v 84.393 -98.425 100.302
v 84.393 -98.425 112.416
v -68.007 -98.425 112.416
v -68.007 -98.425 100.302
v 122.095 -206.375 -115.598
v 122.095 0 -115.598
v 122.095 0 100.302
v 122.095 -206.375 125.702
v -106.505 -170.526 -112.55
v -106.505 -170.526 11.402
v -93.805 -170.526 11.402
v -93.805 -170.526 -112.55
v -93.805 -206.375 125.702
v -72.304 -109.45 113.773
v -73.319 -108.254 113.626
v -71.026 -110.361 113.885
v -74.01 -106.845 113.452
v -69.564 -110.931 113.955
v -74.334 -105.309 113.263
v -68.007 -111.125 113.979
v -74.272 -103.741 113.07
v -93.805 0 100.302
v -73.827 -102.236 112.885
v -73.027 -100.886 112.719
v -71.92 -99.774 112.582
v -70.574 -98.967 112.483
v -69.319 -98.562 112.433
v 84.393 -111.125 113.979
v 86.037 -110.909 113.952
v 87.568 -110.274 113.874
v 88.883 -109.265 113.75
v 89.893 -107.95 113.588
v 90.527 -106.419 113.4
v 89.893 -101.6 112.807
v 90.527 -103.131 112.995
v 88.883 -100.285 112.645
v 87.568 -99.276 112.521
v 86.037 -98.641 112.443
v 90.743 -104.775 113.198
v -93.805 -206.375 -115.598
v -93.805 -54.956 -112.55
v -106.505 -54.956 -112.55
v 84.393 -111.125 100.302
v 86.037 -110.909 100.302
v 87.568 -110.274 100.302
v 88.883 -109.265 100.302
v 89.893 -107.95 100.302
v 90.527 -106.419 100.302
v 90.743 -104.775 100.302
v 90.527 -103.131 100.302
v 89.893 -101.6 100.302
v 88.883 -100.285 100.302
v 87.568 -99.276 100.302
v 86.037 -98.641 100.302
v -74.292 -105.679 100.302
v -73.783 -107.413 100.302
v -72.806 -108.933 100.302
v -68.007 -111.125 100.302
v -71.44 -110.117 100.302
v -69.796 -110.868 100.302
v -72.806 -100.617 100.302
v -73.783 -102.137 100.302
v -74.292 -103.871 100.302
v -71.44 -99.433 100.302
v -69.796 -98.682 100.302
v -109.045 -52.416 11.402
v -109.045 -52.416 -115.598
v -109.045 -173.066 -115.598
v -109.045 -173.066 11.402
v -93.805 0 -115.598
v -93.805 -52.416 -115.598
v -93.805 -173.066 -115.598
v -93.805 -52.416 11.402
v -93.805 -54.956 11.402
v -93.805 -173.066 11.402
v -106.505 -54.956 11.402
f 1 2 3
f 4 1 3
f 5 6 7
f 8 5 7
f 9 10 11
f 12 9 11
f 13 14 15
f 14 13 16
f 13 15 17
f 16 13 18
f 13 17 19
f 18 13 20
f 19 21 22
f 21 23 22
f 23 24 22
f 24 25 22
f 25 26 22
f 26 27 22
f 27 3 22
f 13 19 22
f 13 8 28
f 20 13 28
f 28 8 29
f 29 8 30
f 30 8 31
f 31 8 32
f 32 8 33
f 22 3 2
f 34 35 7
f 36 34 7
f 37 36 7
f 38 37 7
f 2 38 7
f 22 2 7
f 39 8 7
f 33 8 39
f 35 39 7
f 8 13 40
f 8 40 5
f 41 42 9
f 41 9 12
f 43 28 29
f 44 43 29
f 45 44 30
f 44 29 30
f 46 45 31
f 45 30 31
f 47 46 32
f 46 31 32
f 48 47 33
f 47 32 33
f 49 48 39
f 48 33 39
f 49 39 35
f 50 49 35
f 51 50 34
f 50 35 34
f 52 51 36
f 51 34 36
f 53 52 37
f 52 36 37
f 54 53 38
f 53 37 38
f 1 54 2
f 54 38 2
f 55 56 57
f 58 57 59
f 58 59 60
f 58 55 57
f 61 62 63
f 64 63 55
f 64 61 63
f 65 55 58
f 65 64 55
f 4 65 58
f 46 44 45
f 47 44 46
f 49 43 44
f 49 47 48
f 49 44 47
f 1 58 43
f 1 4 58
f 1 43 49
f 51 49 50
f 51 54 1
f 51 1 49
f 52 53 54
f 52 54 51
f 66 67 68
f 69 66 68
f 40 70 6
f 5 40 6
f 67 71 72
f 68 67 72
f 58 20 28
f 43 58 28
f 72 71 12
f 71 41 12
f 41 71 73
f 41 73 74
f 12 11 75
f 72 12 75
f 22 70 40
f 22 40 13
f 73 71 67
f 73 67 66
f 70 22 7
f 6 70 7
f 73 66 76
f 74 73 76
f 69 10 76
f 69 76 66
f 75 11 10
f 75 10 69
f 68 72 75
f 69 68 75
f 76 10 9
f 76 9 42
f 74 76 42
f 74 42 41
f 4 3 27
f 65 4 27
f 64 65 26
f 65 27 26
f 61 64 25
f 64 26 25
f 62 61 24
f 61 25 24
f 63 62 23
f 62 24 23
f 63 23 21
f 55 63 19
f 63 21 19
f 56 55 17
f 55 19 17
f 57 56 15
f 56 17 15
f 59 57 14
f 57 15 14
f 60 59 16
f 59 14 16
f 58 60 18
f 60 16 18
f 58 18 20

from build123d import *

# Parameters (mm, degrees)
F0_W          = 215.9
F0_H          = 241.3
F1_DEPTH      = 206.375
F4_DEPTH      = 25.4
F6_DEPTH      = 197.358
F6_DEPTH_BACK = 177.8
F8_W          = 120.65
F8_H          = 127
F9_DEPTH      = 15.24
F11_W         = 12.7
F11_H         = 115.57
F12_DEPTH     = 123.952


with BuildPart() as f1:
    # F0 (on Front) → F1 (new body)
    with BuildSketch(Plane.XZ):
        with Locations((14.1453973889, 5.0521753728)):
            Rectangle(F0_W, F0_H)
    extrude(amount=F1_DEPTH)

    # F3 (on offset) → F4 (cut)
    with BuildSketch(Plane.XY.offset(125.7021753728)):
        with BuildLine():
            Line((84.393295449, -98.425), (-68.006704551, -98.425))
            ThreePointArc((-68.006704551, -98.425), (-63.5165764904, -100.2848719395), (-61.656704551, -104.775))
            ThreePointArc((-61.656704551, -104.775), (-63.5165764904, -109.2651280605), (-68.006704551, -111.125))
            Line((-68.006704551, -111.125), (84.393295449, -111.125))
            ThreePointArc((84.393295449, -111.125), (78.043295449, -104.775), (84.393295449, -98.425))
        make_face()
        with BuildLine():
            Line((-68.006704551, -111.125), (-68.006704551, -98.425))
            ThreePointArc((-68.006704551, -98.425), (-74.356704551, -104.775), (-68.006704551, -111.125))
        make_face()
        with BuildLine():
            ThreePointArc((-61.656704551, -104.775), (-63.5165764904, -100.2848719395), (-68.006704551, -98.425))
            Line((-68.006704551, -98.425), (-68.006704551, -111.125))
            ThreePointArc((-68.006704551, -111.125), (-63.5165764904, -109.2651280605), (-61.656704551, -104.775))
        make_face()
        with BuildLine():
            ThreePointArc((90.743295449, -104.775), (88.8834235096, -100.2848719395), (84.393295449, -98.425))
            Line((84.393295449, -98.425), (84.393295449, -111.125))
            ThreePointArc((84.393295449, -111.125), (88.8834235096, -109.2651280605), (90.743295449, -104.775))
        make_face()
        with BuildLine():
            Line((84.393295449, -111.125), (84.393295449, -98.425))
            ThreePointArc((84.393295449, -98.425), (78.043295449, -104.775), (84.393295449, -111.125))
        make_face()
    extrude(amount=-F4_DEPTH, mode=Mode.SUBTRACT)

    # F5 (on Right) → F6 (cut, two sides)
    with BuildSketch(Plane.YZ) as f6_sk:
        Polygon((-206.375, 125.7021753728), (0, 100.3021753728), (13.3197874228, 98.0448980824), (13.3197874228, 125.7021753728), align=None)
    extrude(amount=-F6_DEPTH, mode=Mode.SUBTRACT)
    extrude(f6_sk.sketch, amount=F6_DEPTH_BACK, mode=Mode.SUBTRACT)


with BuildPart() as f9:
    # F8 (on offset) → F9 (new body)
    with BuildSketch(Plane(origin=(-93.8046026111, 0, 0), x_dir=(0, -1, 0), z_dir=(-1, 0, 0))):
        with Locations((112.741459161, -52.0978246272)):
            Rectangle(F8_W, F8_H)
    extrude(amount=F9_DEPTH)

    # F11 (on offset) → F12 (cut)
    with BuildSketch(Plane.XY.offset(11.4021753728)):
        with Locations((-100.1546026111, -112.741459161)):
            Rectangle(F11_W, F11_H)
    extrude(amount=-F12_DEPTH, mode=Mode.SUBTRACT)


solid = Compound([f1.part, f9.part])
